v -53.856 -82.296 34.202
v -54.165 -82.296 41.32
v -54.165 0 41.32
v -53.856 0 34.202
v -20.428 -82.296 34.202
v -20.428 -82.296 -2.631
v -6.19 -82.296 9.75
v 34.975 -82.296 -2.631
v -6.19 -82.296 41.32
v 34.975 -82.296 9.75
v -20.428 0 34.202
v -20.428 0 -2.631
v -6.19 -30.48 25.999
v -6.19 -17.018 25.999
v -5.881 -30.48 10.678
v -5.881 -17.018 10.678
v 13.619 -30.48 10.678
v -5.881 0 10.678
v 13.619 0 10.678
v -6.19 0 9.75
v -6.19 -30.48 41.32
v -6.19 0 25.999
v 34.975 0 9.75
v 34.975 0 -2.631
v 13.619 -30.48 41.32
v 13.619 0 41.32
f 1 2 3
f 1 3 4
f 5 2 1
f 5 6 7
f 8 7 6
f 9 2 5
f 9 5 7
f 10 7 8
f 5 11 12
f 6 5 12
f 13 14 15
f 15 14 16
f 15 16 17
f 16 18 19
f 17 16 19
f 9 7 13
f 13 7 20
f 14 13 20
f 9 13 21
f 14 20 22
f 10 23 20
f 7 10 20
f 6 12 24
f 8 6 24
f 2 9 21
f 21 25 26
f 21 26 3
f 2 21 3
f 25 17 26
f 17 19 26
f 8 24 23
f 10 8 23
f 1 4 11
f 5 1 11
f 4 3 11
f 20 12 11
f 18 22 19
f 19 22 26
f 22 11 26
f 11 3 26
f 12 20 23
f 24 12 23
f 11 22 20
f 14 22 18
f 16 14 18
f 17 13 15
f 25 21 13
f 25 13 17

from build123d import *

# Parameters (mm, degrees)
F1_DEPTH = 82.296
F3_DEPTH = 17.018
F4_DEPTH = 13.462


with BuildPart() as f1:
    # F0 (on Front) → F1 (new body)
    with BuildSketch(Plane.XZ):
        Polygon((-19.499537, 41.320443), (-54.165378, 41.320443), (-53.855862, 34.201566), (-20.428086, 34.201566), (-20.428086, 18.106712), (-20.428086, -2.63089), (34.975354, -2.63089), (34.975354, 9.749768), (-6.190328, 9.749768), (-6.190328, 41.320443), align=None)
    extrude(amount=F1_DEPTH)

    # F2 (on Front) → F3 (join)
    with BuildSketch(Plane.XZ):
        Polygon((13.618723, 41.320443), (-6.499845, 41.320443), (-5.880812, 10.678317), (13.618723, 10.678317), align=None)
    extrude(amount=F3_DEPTH)

    # F3_face (on face) → F4 (join)
    with BuildSketch(Plane(origin=(3.752634, -17.018, 26.039435), x_dir=(1, 0, 0), z_dir=(0, -1, 0))):
        Polygon((-9.942962, -0.040067), (-9.633446, -15.361118), (9.866089, -15.361118), (9.866089, 15.281008), (-9.942962, 15.281008), align=None)
    extrude(amount=F4_DEPTH)


solid = f1.part
